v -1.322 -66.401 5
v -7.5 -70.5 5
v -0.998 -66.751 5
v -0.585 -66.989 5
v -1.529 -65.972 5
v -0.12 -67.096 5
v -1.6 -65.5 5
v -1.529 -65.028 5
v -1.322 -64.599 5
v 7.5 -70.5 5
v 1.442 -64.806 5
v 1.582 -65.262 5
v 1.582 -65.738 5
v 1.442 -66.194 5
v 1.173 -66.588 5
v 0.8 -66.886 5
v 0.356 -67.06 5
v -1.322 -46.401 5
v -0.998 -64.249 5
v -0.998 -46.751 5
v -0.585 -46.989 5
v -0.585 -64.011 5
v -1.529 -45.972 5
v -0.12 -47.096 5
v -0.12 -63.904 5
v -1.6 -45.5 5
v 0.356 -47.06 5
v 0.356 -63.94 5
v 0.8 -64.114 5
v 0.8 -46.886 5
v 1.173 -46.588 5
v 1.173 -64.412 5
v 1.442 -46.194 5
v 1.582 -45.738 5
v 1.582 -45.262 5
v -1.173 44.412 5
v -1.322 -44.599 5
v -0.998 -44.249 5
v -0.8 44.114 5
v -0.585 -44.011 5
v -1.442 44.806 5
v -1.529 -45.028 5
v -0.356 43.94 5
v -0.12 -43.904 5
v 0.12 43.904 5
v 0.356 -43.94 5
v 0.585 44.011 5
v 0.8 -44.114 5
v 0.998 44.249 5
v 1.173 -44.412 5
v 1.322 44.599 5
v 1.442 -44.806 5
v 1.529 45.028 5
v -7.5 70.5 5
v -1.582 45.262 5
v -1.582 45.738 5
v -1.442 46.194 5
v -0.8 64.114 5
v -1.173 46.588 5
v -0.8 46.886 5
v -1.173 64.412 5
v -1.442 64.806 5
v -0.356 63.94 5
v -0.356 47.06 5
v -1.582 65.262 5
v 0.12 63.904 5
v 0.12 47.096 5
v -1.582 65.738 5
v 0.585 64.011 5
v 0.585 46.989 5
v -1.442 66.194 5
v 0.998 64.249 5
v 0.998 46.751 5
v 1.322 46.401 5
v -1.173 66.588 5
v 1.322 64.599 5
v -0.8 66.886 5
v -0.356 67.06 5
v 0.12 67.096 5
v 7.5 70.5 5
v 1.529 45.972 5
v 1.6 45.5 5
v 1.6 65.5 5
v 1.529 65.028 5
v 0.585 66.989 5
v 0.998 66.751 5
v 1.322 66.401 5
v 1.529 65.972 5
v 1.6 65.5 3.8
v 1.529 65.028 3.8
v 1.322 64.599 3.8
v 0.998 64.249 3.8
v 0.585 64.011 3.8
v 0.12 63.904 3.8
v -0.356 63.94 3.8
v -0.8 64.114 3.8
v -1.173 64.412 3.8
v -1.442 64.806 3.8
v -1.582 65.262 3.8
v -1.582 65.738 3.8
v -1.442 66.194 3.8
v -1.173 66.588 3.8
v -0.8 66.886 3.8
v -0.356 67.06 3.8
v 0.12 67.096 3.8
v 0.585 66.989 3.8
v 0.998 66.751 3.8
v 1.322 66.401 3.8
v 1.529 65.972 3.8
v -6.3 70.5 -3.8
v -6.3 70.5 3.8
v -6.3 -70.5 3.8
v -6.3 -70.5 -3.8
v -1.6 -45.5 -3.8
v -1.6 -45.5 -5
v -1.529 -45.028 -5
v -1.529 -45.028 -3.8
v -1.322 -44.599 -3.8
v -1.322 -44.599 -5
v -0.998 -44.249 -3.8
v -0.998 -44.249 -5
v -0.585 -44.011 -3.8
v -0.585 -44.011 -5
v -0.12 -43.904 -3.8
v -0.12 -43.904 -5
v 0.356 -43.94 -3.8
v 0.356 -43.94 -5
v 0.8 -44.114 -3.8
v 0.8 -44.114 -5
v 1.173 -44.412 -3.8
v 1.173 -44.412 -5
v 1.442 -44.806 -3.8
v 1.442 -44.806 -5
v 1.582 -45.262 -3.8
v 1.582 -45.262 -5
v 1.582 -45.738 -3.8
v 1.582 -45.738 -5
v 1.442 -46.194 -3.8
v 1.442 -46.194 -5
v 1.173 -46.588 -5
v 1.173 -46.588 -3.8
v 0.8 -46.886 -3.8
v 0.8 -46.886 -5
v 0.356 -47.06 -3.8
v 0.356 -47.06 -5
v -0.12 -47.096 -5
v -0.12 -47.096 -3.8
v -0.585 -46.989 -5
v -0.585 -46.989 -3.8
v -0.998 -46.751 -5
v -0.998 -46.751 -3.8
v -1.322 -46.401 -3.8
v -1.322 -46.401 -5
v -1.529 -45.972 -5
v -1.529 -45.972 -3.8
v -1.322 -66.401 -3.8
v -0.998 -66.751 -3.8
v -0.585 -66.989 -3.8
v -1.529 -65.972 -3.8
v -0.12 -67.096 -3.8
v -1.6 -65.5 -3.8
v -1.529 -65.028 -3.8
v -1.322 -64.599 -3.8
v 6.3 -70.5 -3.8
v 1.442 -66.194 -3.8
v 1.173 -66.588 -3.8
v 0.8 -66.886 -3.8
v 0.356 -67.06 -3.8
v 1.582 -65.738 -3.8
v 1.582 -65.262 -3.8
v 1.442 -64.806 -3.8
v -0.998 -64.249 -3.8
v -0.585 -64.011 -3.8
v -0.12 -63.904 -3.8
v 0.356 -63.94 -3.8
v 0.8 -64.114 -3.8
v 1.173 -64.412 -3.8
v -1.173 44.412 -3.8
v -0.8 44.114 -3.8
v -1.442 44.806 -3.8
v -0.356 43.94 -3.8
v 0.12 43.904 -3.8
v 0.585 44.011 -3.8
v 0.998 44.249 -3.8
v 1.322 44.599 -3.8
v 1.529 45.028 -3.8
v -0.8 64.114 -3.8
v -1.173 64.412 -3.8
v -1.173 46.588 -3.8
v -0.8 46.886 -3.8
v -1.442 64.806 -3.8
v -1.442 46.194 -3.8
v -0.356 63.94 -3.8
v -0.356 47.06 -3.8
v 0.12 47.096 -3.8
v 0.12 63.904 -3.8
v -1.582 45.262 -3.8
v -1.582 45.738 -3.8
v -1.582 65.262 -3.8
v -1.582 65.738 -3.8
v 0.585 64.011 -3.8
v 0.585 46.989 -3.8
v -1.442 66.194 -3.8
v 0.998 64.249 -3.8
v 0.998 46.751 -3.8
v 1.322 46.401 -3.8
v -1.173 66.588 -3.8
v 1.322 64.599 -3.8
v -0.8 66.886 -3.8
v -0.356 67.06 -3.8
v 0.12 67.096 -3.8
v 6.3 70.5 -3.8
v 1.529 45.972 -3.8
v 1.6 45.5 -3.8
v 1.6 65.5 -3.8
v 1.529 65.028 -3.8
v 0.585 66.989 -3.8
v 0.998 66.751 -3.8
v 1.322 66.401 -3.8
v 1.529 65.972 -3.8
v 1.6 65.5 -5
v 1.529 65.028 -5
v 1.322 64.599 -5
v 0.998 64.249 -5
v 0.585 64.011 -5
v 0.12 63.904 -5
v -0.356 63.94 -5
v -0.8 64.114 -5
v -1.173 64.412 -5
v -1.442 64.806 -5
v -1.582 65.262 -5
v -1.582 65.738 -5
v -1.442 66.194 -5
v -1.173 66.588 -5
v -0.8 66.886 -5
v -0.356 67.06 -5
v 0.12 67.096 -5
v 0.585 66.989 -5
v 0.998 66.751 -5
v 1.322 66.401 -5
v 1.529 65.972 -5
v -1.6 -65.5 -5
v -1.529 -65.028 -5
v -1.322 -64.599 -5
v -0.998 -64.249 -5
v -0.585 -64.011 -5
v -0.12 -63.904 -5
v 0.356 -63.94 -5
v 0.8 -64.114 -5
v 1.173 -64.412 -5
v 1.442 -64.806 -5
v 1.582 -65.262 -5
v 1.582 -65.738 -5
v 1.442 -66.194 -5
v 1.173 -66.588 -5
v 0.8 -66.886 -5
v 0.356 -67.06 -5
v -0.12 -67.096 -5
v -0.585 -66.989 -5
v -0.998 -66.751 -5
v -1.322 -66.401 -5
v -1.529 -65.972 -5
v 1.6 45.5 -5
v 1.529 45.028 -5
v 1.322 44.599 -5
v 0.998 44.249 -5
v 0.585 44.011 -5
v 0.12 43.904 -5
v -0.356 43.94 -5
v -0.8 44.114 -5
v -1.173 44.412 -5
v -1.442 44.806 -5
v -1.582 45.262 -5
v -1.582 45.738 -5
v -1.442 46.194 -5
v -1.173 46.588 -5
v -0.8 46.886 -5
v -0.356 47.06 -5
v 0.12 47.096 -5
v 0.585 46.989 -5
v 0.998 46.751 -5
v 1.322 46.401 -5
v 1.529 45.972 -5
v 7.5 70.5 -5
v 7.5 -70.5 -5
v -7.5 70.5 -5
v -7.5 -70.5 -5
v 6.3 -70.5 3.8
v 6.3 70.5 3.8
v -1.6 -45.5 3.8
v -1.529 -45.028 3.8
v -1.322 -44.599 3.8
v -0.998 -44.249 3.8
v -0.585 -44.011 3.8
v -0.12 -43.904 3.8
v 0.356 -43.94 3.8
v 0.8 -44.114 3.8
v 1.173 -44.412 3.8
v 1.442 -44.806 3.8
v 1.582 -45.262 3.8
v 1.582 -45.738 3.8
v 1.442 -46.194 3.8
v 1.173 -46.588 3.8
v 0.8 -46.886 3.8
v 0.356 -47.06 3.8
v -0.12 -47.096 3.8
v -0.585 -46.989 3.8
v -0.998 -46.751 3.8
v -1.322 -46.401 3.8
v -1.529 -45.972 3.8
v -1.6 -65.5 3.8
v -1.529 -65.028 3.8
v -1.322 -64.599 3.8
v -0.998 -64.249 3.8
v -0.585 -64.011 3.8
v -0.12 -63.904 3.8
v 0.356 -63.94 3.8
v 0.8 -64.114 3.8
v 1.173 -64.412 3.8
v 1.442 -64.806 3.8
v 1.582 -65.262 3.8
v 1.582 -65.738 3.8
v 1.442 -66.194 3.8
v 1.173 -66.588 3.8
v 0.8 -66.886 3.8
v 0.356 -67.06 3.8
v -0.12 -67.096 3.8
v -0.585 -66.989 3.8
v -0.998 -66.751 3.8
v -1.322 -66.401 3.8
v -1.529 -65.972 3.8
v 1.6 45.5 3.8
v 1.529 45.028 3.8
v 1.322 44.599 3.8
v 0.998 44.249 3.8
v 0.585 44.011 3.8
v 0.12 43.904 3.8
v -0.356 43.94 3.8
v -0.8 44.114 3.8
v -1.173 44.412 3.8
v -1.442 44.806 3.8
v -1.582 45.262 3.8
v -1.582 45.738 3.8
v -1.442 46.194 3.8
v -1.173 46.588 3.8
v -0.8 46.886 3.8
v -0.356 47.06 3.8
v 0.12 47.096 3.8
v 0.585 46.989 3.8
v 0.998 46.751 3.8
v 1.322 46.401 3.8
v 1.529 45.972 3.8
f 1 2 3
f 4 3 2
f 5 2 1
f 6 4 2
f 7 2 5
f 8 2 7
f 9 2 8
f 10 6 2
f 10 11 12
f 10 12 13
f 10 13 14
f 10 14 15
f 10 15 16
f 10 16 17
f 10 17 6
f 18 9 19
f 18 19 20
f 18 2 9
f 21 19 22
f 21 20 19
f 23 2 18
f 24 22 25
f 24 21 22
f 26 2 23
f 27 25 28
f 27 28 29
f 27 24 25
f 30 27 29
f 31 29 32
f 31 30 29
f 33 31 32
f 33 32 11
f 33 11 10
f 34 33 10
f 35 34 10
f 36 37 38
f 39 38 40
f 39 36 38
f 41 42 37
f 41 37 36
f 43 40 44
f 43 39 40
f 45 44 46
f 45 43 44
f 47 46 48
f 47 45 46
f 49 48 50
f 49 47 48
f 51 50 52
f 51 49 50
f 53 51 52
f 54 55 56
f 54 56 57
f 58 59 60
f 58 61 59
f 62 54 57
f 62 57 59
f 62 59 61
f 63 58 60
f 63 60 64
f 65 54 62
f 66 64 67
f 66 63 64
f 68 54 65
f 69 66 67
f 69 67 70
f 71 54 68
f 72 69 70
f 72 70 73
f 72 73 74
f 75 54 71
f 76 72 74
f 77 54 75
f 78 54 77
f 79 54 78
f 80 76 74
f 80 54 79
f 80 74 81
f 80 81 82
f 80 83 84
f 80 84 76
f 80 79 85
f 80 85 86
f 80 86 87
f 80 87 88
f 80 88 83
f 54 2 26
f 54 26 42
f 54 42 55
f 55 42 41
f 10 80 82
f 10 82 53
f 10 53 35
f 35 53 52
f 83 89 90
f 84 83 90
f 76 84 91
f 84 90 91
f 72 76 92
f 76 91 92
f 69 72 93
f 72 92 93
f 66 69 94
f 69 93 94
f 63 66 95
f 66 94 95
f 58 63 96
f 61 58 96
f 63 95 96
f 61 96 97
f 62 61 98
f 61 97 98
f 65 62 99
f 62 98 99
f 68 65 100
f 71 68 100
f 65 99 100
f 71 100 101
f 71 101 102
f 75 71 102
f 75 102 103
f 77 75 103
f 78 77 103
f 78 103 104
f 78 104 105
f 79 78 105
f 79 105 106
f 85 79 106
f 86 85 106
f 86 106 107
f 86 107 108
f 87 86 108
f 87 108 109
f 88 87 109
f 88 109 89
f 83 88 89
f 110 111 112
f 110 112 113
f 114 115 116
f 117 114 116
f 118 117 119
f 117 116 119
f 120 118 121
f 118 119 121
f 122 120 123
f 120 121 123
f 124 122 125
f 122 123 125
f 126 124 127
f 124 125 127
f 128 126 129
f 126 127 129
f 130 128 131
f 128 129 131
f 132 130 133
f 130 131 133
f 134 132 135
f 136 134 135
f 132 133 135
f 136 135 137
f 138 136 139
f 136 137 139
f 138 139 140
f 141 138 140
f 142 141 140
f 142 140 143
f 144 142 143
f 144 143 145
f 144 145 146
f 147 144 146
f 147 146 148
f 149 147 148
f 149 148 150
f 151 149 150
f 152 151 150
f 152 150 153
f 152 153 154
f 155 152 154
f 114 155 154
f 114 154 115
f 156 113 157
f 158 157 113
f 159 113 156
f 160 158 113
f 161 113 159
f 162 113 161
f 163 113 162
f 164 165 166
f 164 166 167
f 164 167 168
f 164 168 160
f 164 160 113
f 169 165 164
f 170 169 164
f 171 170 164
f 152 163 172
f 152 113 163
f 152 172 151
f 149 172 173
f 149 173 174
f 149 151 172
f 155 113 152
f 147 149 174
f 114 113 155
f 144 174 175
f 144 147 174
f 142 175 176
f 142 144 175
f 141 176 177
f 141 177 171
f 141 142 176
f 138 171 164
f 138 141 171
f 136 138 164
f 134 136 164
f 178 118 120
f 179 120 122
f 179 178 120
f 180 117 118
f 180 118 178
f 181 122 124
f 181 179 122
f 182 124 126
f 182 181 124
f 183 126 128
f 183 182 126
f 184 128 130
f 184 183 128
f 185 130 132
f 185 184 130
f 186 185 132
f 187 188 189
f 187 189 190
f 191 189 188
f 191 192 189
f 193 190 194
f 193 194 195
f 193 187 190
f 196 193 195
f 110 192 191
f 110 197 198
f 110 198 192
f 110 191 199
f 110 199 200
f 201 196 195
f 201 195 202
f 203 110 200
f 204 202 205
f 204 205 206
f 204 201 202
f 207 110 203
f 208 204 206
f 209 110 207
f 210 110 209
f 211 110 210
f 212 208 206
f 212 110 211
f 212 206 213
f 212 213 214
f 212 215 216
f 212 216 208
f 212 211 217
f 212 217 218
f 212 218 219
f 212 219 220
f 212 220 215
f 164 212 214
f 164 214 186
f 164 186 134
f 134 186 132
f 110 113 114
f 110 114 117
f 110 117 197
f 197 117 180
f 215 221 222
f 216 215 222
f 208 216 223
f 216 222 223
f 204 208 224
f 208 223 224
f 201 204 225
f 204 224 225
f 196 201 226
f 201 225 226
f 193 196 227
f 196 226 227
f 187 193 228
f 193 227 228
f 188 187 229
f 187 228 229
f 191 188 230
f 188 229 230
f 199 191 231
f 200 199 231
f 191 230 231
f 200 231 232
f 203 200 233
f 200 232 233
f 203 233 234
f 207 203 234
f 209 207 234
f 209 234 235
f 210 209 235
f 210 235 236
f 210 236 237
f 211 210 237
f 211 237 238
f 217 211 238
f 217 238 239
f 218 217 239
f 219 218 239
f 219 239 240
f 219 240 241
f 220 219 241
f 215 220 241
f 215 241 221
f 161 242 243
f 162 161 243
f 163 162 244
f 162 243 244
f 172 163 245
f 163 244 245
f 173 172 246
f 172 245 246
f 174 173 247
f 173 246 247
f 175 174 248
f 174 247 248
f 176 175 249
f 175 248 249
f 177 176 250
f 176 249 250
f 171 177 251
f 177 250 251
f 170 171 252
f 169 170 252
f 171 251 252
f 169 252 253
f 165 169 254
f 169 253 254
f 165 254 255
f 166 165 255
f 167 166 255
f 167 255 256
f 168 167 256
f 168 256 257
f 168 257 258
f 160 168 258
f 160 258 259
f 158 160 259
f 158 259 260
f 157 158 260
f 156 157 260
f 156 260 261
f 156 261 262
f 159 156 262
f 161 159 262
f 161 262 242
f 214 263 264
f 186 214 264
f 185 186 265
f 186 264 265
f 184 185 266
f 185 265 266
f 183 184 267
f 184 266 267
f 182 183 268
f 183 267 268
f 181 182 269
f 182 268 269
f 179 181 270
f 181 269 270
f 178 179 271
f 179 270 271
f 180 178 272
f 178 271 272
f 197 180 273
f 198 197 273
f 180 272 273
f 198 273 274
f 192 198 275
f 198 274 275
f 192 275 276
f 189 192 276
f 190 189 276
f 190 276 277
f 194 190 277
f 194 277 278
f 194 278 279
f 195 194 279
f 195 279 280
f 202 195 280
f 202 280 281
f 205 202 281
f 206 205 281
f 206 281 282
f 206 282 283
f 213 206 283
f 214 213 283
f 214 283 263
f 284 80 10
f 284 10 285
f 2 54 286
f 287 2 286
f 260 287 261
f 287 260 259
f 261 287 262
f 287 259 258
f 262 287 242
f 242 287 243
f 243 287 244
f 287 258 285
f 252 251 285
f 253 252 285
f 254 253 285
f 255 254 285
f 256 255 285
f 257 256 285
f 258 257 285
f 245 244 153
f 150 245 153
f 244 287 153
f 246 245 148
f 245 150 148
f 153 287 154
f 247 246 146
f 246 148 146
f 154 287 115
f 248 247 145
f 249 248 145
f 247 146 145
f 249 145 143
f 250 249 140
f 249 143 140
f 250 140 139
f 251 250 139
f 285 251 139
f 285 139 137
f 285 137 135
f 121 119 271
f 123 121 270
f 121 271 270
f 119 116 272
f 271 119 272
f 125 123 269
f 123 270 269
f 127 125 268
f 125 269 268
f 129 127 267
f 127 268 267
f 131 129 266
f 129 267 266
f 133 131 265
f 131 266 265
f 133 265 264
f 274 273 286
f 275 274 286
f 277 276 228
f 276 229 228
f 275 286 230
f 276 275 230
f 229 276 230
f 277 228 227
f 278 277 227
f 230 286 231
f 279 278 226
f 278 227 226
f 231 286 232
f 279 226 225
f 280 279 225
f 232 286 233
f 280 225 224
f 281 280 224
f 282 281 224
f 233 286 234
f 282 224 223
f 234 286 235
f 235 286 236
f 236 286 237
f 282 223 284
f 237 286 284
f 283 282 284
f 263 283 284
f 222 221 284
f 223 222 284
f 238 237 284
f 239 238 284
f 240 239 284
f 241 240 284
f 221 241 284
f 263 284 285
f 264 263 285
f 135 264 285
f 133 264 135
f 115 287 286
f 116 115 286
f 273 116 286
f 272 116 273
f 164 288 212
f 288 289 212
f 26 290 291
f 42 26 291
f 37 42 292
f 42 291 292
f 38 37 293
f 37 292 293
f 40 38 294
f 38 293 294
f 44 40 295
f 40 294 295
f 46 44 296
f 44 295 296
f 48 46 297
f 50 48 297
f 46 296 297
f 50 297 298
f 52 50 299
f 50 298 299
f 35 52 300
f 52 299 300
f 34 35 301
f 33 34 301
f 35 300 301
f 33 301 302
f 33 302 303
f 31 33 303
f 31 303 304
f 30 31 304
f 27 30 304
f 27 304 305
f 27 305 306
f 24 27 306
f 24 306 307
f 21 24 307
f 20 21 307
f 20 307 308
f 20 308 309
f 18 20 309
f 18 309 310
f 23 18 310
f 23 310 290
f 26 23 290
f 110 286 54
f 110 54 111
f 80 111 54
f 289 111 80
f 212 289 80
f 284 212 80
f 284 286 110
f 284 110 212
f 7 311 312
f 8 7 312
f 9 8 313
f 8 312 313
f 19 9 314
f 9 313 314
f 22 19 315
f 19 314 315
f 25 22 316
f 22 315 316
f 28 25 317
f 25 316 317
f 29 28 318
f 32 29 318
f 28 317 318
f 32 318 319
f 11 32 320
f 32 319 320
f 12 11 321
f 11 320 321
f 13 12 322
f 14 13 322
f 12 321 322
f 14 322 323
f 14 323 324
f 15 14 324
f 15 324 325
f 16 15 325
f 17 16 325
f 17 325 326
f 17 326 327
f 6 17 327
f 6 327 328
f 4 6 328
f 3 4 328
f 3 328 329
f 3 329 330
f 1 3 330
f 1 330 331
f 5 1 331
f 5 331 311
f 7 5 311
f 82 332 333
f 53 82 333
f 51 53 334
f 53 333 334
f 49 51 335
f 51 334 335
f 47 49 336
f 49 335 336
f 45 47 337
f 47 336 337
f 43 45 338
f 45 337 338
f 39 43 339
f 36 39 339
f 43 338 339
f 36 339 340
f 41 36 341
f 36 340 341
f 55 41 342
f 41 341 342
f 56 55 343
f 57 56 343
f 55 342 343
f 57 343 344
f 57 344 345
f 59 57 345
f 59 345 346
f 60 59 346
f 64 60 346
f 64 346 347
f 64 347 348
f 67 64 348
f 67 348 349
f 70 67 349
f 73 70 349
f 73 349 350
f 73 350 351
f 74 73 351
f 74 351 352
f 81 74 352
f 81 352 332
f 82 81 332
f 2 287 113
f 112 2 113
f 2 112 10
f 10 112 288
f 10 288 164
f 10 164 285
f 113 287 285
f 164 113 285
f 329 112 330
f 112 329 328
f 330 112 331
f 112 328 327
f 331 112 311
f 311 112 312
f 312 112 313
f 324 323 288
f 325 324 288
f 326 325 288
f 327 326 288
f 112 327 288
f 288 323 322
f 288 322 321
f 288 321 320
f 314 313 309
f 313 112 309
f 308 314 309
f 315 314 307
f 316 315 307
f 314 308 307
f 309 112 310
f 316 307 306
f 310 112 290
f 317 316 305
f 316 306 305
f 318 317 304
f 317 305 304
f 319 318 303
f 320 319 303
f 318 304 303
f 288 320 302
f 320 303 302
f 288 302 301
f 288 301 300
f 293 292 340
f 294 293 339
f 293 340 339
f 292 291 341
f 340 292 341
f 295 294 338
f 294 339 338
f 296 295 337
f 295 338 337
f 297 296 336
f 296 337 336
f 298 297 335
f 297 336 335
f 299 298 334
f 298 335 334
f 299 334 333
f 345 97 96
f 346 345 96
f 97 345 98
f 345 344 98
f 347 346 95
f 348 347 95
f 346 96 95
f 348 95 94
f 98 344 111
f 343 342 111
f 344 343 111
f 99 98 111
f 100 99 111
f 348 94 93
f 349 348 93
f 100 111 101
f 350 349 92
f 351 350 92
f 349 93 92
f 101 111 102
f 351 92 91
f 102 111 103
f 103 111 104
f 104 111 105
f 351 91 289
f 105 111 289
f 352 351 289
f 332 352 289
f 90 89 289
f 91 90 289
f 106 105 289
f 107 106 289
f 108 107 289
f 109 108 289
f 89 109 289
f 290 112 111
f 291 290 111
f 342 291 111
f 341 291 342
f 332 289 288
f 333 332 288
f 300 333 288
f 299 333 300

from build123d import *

# Parameters (mm, degrees)
SKETCH_1_W          = 15
SKETCH_1_H          = 10
SKETCH_1_W_2        = 12.6
SKETCH_1_H_2        = 7.6
EXTRUDE_1_DEPTH     = 70.5
SKETCH_2_R          = 1.6
CUT_EXTRUDE_1_DEPTH = 100


with BuildPart() as part:
    # ｽｹｯﾁ1 → ﾎﾞｽ - 押し出し1 (new, symmetric)
    with BuildSketch(Plane(origin=(0, 0, 0), x_dir=(1, 0, 0), z_dir=(0, 1, 0))):
        Rectangle(SKETCH_1_W, SKETCH_1_H)
        Rectangle(SKETCH_1_W_2, SKETCH_1_H_2, mode=Mode.SUBTRACT)
    extrude(amount=EXTRUDE_1_DEPTH, both=True)

    # ｽｹｯﾁ2 → ｶｯﾄ - 押し出し1 (cut)
    with BuildSketch(Plane(origin=(0, 0, -5), x_dir=(-1, 0, 0), z_dir=(0, 0, -1))):
        with Locations((0, -65.5)):
            Circle(SKETCH_2_R)
        with Locations((0, -45.5)):
            Circle(SKETCH_2_R)
        with Locations(Location((0, 45.5, 0), (0, 0, 180))):
            Circle(SKETCH_2_R)
        with Locations(Location((0, 65.5, 0), (0, 0, 180))):
            Circle(SKETCH_2_R)
    extrude(amount=-CUT_EXTRUDE_1_DEPTH, mode=Mode.SUBTRACT)


solid = part.part
